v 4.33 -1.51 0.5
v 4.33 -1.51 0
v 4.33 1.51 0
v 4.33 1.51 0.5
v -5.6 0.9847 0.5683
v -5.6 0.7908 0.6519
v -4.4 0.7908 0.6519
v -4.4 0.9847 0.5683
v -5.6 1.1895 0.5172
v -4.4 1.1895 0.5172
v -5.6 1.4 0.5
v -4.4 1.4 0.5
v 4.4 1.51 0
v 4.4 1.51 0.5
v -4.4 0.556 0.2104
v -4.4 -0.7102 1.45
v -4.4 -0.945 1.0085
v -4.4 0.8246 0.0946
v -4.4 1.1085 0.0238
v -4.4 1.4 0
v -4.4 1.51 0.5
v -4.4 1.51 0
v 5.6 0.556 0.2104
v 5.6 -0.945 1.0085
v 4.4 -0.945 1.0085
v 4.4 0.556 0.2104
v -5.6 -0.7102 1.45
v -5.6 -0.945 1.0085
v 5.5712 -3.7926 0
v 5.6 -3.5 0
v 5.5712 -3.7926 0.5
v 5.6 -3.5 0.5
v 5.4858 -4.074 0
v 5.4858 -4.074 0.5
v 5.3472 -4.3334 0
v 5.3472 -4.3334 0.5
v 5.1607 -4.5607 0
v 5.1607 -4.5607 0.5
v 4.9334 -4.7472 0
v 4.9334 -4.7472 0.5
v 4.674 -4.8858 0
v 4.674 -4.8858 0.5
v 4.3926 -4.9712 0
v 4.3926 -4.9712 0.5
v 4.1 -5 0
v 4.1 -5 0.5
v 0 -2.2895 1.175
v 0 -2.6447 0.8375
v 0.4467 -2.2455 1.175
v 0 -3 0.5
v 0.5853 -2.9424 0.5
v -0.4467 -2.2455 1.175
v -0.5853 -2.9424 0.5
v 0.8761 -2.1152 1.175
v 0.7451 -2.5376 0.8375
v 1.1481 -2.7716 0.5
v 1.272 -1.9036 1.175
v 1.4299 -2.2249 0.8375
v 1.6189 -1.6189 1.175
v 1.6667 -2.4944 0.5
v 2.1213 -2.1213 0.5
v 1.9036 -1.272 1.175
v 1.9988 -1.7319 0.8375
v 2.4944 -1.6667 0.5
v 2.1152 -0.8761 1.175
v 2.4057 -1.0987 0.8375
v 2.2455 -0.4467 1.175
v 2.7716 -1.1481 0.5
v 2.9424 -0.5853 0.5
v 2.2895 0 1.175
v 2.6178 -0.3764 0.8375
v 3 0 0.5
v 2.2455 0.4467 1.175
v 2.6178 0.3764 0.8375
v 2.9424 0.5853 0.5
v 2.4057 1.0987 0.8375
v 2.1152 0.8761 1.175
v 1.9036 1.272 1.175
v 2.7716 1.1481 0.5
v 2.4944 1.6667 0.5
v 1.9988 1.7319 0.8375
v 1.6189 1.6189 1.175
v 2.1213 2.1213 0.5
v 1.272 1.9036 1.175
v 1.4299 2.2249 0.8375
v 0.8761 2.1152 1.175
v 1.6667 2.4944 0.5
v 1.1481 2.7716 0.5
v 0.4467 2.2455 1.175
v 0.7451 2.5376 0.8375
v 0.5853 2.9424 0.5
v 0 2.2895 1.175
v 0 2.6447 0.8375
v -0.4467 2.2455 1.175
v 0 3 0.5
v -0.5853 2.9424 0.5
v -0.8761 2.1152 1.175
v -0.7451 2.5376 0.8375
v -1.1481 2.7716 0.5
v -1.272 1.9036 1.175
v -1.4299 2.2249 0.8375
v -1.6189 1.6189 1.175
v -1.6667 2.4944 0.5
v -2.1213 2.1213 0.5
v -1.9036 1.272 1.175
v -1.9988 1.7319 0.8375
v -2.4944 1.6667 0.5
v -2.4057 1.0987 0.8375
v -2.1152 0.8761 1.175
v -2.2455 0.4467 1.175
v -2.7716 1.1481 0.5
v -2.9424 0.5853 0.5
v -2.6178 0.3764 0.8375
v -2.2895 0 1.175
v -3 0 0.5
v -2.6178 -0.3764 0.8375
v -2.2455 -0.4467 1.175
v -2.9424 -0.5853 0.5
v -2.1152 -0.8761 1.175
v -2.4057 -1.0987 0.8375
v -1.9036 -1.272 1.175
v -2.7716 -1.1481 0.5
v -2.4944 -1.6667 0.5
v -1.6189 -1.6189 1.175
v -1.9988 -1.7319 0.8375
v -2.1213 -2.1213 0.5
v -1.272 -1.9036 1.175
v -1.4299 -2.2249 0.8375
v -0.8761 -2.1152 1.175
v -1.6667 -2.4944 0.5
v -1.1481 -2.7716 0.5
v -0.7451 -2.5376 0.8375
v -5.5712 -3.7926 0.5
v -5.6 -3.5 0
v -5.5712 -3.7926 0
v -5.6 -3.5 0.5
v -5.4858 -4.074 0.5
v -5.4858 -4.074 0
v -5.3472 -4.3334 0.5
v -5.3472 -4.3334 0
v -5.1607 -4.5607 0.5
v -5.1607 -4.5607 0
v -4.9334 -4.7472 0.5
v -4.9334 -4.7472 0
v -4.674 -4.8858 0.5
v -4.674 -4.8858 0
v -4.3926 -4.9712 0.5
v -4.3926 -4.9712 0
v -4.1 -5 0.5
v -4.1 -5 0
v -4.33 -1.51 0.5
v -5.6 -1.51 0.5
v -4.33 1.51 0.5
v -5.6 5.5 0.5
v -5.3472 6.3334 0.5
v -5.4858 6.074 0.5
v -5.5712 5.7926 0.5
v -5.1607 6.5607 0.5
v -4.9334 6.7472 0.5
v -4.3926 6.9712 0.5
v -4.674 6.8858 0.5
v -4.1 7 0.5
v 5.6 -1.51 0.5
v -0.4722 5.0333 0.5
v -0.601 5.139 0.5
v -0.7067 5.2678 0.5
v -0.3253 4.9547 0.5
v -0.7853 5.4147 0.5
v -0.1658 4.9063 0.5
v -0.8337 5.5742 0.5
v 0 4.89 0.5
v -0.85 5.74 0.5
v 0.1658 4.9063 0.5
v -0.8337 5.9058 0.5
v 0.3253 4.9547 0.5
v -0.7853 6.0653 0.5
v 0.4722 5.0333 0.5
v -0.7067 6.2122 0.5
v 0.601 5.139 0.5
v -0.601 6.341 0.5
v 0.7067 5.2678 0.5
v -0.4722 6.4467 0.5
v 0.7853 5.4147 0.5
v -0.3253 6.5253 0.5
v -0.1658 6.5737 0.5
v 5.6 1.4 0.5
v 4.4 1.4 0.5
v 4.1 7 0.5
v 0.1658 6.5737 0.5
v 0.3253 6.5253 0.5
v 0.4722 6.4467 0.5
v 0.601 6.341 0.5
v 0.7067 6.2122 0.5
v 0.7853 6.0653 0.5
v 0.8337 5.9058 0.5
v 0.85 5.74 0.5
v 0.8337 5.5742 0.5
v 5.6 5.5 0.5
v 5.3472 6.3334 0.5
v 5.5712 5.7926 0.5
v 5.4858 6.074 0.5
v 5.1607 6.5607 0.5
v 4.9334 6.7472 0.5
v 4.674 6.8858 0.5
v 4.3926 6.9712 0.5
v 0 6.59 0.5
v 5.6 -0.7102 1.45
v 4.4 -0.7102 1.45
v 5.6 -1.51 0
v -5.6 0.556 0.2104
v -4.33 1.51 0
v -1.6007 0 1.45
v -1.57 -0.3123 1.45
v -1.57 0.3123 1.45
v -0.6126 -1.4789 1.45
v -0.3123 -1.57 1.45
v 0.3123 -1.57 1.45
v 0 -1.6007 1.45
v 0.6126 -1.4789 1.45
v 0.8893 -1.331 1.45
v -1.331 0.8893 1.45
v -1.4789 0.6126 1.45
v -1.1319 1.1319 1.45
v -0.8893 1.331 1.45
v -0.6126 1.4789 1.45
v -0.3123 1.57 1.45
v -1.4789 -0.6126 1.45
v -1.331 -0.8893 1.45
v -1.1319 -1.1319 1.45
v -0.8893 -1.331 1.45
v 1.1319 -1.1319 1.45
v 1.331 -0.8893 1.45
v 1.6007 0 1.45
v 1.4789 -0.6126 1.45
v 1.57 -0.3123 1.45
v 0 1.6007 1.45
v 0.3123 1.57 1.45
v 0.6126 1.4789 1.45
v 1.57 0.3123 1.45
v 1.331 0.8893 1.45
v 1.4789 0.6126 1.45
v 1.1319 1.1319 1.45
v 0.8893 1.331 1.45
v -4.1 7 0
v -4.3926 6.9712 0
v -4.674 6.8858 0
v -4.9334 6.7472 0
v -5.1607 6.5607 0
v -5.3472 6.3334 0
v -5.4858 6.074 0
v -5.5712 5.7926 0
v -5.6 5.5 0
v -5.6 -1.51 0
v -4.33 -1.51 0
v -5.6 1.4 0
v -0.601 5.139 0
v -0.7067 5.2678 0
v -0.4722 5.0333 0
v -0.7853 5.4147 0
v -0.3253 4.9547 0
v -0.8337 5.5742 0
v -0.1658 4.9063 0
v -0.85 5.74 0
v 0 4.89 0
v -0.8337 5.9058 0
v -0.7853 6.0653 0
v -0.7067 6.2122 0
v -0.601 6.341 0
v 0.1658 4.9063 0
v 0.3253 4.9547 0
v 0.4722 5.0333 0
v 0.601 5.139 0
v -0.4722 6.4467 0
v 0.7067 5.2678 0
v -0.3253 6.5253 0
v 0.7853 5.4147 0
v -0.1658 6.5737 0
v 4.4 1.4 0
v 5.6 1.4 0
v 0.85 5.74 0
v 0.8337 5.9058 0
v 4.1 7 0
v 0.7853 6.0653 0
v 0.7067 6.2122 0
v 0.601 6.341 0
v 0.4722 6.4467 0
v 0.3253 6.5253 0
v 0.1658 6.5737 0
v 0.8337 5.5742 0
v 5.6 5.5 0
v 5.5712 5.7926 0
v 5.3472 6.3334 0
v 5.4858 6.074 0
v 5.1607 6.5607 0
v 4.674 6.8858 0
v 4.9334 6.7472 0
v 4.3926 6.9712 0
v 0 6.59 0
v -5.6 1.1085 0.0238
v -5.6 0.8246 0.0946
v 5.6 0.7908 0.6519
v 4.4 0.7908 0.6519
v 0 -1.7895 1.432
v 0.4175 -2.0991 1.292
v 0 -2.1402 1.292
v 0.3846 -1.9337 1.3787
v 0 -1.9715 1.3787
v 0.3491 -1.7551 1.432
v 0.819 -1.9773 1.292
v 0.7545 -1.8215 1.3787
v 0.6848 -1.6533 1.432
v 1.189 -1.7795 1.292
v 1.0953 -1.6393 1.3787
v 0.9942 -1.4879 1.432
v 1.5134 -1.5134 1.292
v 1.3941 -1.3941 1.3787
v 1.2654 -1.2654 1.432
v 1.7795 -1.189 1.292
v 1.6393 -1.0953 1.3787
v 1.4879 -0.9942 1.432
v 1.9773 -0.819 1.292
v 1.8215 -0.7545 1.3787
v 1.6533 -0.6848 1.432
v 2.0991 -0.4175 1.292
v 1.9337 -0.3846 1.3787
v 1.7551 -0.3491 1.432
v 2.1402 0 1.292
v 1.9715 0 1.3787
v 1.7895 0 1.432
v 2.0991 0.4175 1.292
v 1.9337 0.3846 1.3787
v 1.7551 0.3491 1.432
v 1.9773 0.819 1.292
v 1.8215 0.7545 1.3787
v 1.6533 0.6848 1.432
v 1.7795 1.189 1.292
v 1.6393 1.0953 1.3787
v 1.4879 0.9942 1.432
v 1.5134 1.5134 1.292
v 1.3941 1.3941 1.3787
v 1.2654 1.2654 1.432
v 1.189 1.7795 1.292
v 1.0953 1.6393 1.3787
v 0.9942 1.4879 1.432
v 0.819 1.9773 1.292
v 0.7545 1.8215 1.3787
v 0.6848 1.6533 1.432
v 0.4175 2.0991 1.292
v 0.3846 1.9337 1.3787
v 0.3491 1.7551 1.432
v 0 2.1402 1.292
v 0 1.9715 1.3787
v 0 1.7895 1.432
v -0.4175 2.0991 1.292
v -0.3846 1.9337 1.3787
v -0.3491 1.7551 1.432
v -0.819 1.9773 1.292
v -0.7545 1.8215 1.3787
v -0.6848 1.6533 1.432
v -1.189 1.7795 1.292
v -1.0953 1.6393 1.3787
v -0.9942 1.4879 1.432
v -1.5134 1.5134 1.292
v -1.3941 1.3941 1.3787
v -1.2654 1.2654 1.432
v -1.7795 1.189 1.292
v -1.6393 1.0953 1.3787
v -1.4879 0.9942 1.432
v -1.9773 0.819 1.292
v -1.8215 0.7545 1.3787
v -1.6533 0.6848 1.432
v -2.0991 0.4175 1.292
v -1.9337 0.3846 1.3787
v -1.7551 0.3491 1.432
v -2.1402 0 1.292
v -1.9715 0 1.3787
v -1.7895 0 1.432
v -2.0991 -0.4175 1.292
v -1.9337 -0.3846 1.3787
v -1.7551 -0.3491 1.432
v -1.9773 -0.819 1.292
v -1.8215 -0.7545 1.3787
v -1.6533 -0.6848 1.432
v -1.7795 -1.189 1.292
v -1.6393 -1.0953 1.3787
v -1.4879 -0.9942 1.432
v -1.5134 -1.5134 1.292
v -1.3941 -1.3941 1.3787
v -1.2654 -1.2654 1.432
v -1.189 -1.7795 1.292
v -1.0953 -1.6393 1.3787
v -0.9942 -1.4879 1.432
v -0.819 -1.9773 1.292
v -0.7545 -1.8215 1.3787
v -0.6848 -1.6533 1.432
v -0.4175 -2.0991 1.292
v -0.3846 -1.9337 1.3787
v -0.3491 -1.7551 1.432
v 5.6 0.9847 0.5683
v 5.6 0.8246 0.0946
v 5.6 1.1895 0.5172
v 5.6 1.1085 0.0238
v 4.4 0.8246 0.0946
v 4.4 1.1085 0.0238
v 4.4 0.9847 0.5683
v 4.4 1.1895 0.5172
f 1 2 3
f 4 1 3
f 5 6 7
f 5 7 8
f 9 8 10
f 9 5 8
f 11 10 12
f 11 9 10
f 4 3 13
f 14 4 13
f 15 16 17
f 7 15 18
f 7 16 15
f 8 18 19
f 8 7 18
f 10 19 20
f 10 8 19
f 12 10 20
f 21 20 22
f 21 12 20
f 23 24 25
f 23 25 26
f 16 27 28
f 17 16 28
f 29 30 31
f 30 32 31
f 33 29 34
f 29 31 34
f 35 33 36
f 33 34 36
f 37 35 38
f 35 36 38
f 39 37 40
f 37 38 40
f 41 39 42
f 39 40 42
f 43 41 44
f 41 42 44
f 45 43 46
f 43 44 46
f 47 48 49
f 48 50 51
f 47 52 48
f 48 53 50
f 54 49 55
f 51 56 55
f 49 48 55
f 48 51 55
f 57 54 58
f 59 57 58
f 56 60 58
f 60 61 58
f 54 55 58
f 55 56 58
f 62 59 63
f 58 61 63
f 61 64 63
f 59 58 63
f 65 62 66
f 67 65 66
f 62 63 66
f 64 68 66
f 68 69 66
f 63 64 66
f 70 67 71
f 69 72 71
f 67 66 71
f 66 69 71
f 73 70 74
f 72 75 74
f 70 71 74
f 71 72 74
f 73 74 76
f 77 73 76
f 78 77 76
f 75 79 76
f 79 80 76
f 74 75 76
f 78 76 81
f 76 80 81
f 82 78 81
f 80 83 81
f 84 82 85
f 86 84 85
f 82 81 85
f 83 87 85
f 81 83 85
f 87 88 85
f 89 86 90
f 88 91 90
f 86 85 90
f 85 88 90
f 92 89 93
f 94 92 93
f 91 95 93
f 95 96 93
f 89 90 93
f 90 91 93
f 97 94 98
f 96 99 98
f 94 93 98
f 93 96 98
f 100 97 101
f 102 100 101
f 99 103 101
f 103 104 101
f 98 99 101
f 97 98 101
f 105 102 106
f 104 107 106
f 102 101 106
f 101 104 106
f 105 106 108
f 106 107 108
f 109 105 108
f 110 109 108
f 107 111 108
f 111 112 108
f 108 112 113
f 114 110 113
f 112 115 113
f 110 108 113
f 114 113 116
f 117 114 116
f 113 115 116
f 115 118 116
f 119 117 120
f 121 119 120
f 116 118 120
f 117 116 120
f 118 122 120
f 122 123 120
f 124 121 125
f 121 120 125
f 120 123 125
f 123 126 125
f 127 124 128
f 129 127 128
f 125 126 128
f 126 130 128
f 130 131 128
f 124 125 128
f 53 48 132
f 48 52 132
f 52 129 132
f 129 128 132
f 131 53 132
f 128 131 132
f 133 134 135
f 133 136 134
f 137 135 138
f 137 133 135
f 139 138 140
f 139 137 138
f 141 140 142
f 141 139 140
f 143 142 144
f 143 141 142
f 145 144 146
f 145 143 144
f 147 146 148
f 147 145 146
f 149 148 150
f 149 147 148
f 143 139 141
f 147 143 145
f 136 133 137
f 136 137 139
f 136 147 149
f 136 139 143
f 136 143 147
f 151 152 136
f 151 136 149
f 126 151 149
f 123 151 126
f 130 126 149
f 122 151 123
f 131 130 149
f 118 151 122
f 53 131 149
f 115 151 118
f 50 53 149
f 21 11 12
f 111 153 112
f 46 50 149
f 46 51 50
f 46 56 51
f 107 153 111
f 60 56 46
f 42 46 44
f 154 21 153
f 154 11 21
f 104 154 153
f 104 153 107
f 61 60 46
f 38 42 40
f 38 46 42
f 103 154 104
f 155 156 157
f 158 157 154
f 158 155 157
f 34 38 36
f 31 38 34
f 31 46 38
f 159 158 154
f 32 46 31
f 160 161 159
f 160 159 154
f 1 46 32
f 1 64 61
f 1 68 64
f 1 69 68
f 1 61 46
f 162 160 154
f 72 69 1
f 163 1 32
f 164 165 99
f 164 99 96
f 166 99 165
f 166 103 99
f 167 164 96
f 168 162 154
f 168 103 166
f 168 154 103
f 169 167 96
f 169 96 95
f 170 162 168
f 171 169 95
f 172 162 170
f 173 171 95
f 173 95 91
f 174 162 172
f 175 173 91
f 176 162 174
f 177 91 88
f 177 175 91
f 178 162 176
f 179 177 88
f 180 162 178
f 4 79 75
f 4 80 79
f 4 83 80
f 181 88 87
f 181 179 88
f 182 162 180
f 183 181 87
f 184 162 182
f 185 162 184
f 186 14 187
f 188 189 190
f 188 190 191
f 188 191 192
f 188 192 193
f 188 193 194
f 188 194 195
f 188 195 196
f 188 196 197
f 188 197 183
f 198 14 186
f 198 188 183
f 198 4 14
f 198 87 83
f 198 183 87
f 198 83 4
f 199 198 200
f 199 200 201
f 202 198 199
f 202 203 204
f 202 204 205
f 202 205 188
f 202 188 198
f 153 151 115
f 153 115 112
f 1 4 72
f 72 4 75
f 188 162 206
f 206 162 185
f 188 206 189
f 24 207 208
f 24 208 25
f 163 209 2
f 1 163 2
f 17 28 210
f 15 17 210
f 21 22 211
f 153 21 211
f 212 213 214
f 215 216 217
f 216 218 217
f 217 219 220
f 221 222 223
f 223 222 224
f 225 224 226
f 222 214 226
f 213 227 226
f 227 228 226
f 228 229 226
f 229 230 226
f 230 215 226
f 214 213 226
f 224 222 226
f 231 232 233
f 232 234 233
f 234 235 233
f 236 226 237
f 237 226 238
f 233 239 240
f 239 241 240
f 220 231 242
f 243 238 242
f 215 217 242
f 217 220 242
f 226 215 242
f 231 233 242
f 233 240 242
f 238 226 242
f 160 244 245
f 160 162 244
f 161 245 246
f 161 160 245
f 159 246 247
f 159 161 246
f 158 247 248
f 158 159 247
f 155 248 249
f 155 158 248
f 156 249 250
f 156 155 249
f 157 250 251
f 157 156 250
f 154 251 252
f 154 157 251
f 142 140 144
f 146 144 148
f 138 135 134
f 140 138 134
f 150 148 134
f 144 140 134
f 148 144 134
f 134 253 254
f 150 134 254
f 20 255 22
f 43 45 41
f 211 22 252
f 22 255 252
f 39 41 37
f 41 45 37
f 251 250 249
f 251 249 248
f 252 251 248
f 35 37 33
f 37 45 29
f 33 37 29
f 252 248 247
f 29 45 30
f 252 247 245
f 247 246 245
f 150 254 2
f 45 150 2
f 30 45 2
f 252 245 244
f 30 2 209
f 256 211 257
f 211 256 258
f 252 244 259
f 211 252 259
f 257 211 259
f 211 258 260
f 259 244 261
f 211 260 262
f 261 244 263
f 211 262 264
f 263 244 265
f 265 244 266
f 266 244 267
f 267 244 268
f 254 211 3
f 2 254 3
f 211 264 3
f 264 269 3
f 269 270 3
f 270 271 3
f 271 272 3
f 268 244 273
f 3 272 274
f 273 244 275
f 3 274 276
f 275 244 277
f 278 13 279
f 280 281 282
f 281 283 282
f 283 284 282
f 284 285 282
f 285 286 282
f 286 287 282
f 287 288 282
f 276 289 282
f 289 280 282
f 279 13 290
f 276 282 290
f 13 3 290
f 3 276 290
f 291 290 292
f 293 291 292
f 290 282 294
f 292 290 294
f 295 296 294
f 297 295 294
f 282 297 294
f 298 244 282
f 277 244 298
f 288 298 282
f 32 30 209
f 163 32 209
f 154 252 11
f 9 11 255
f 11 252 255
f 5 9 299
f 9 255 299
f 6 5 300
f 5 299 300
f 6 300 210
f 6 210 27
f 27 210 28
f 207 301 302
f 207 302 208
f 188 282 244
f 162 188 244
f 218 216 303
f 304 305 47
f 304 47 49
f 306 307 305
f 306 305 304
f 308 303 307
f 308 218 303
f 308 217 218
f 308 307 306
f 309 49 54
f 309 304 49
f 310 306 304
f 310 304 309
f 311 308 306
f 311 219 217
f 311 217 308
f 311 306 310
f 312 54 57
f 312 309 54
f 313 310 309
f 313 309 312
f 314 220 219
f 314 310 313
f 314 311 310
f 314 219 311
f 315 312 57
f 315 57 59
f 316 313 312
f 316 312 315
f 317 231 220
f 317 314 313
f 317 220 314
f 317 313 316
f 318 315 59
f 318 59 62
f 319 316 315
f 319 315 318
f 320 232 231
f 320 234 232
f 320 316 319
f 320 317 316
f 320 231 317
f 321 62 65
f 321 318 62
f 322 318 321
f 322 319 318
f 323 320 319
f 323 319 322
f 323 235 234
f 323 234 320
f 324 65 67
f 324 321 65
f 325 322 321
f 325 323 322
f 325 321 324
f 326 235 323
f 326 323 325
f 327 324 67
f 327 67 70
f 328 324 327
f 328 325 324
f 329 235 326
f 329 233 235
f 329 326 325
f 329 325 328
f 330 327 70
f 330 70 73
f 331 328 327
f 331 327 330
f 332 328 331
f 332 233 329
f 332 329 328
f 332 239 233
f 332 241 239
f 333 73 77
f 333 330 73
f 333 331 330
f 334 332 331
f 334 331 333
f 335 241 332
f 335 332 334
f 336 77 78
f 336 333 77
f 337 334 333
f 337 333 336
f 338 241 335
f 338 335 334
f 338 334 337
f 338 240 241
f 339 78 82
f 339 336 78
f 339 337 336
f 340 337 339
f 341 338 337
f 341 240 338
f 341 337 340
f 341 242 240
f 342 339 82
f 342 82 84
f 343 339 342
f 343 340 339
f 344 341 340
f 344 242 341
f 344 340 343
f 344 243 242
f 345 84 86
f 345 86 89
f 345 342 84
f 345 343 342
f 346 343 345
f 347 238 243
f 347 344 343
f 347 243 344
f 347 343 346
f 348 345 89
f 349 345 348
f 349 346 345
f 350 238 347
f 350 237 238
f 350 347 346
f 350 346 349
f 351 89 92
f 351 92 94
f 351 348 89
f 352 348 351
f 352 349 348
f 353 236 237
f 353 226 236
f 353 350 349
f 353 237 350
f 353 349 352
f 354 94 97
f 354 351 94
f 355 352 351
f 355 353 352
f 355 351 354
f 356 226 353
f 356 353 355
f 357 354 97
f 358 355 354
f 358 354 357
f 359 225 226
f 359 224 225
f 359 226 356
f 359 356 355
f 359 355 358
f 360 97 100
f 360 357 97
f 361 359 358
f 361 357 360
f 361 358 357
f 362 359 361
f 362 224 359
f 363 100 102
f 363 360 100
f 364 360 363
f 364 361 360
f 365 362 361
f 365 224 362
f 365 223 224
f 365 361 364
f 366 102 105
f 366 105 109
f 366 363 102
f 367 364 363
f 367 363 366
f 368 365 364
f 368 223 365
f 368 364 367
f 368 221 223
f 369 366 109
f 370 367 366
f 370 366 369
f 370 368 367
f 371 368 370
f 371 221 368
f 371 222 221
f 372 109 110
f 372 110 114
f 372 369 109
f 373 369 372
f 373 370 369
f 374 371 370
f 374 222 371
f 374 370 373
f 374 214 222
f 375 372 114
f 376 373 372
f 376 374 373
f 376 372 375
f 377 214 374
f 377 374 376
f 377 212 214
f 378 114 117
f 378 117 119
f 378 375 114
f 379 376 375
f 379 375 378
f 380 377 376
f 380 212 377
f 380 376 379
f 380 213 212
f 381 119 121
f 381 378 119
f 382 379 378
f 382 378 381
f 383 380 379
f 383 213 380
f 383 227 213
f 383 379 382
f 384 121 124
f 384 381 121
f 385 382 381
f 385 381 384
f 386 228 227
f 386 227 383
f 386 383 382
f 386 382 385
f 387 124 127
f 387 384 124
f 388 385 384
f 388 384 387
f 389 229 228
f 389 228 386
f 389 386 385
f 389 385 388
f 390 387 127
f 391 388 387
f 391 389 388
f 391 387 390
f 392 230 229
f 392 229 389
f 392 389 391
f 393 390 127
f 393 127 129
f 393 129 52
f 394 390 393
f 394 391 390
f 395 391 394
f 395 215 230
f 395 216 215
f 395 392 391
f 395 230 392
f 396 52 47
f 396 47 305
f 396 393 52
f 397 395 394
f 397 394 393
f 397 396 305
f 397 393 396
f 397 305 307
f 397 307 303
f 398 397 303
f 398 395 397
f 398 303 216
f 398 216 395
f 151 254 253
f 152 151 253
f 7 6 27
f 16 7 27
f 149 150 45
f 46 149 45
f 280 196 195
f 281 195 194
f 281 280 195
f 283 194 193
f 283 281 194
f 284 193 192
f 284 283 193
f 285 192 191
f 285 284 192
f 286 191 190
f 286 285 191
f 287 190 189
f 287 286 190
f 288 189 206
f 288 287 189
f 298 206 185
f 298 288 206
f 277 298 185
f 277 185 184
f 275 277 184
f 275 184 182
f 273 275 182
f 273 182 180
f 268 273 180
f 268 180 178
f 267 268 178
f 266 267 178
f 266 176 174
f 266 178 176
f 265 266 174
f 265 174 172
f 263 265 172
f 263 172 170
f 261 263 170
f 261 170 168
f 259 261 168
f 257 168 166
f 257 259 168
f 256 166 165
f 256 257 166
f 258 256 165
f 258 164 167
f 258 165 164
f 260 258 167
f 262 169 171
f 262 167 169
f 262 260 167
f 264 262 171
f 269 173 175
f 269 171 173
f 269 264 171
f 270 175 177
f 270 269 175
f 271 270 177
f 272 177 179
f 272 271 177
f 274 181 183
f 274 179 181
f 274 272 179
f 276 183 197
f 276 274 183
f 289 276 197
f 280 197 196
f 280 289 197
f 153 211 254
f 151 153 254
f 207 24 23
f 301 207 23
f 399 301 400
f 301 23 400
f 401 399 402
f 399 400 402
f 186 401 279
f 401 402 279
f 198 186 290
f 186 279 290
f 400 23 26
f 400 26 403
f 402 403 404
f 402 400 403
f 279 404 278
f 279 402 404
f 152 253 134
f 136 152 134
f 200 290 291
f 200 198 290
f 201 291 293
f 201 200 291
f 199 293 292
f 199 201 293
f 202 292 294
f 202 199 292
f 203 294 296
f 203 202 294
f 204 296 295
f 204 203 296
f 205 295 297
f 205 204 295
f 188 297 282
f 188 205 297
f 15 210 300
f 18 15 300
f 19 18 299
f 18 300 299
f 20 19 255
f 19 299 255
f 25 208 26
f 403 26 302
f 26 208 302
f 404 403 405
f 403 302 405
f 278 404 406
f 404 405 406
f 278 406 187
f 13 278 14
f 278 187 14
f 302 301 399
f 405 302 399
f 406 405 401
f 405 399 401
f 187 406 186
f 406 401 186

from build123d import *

# Parameters (mm, degrees)
PAD_DEPTH     = 0.5
SKETCH001_R   = 0.76
HOLE_DEPTH    = 0.501
FILLET_R      = 1.5
SKETCH002_R   = 0.85
HOLE001_DEPTH = 0.501
PAD001_DEPTH  = 1.2
FILLET001_R   = 1


with BuildPart() as part:
    # Sketch → Pad (new body)
    with BuildSketch(Plane.XY):
        Polygon((0, -5), (5.6, -5), (5.6, -1.51), (4.33, -1.51), (4.33, 1.51), (5.6, 1.51), (5.6, 7), (1.5, 7), (-1.5, 7), (-5.6, 7), (-5.6, 1.51), (-4.33, 1.51), (-4.33, -1.51), (-5.6, -1.51), (-5.6, -5), align=None)
    extrude(amount=PAD_DEPTH)

    # Sketch001 → Hole (cut, through all)
    with BuildSketch(Plane.XY):
        with Locations((0, 11.84)):
            Circle(SKETCH001_R)
    extrude(amount=HOLE_DEPTH, mode=Mode.SUBTRACT)

    # Fillet
    fillet_edges = [part.edges().sort_by_distance(p)[0] for p in [
        (-5.6, 7, 0.25),
        (-5.6, -5, 0.25),
        (5.6, 7, 0.25),
        (5.6, -5, 0.25),
    ]]
    fillet(fillet_edges, radius=FILLET_R)

    # Sketch002 → Hole001 (cut, through all)
    with BuildSketch(Plane.XY):
        with Locations((0, 5.74)):
            Circle(SKETCH002_R)
    extrude(amount=HOLE001_DEPTH, mode=Mode.SUBTRACT)

    # Sketch003 → Revolution (revolve)
    with BuildSketch(Plane.YZ):
        Polygon((-3, 0.5), (0, 0.5), (0, 1.45), (-2, 1.45), align=None)
    revolve(axis=Axis((0, 0, 0), (0, 0, 1)))

    # Sketch004 → Pad001 (join)
    with BuildSketch(Plane.YZ.offset(5.6)):
        with BuildLine():
            Line((2, 0), (2, 0.5))
            Line((2, 0.5), (1.4, 0.5))
            ThreePointArc((0.790769, 0.651898), (1.086059, 0.538547), (1.4, 0.5))
            Line((0.790769, 0.651898), (-0.710242, 1.45))
            Line((-0.710242, 1.45), (-0.944978, 1.008526))
            Line((-0.944978, 1.008526), (0.556033, 0.210425))
            ThreePointArc((0.556033, 0.210425), (0.965098, 0.053399), (1.4, 0))
            Line((1.4, 0), (2, 0))
        make_face()
    pad001 = extrude(amount=-PAD001_DEPTH)

    # Fillet001
    fillet001_edges = [part.edges().sort_by_distance(p)[0] for p in [
        (0, 2, 1.45),
    ]]
    fillet(fillet001_edges, radius=FILLET001_R)

    # Mirrored: Pad001 across YZ
    add(pad001.mirror(Plane.YZ))


solid = part.part
